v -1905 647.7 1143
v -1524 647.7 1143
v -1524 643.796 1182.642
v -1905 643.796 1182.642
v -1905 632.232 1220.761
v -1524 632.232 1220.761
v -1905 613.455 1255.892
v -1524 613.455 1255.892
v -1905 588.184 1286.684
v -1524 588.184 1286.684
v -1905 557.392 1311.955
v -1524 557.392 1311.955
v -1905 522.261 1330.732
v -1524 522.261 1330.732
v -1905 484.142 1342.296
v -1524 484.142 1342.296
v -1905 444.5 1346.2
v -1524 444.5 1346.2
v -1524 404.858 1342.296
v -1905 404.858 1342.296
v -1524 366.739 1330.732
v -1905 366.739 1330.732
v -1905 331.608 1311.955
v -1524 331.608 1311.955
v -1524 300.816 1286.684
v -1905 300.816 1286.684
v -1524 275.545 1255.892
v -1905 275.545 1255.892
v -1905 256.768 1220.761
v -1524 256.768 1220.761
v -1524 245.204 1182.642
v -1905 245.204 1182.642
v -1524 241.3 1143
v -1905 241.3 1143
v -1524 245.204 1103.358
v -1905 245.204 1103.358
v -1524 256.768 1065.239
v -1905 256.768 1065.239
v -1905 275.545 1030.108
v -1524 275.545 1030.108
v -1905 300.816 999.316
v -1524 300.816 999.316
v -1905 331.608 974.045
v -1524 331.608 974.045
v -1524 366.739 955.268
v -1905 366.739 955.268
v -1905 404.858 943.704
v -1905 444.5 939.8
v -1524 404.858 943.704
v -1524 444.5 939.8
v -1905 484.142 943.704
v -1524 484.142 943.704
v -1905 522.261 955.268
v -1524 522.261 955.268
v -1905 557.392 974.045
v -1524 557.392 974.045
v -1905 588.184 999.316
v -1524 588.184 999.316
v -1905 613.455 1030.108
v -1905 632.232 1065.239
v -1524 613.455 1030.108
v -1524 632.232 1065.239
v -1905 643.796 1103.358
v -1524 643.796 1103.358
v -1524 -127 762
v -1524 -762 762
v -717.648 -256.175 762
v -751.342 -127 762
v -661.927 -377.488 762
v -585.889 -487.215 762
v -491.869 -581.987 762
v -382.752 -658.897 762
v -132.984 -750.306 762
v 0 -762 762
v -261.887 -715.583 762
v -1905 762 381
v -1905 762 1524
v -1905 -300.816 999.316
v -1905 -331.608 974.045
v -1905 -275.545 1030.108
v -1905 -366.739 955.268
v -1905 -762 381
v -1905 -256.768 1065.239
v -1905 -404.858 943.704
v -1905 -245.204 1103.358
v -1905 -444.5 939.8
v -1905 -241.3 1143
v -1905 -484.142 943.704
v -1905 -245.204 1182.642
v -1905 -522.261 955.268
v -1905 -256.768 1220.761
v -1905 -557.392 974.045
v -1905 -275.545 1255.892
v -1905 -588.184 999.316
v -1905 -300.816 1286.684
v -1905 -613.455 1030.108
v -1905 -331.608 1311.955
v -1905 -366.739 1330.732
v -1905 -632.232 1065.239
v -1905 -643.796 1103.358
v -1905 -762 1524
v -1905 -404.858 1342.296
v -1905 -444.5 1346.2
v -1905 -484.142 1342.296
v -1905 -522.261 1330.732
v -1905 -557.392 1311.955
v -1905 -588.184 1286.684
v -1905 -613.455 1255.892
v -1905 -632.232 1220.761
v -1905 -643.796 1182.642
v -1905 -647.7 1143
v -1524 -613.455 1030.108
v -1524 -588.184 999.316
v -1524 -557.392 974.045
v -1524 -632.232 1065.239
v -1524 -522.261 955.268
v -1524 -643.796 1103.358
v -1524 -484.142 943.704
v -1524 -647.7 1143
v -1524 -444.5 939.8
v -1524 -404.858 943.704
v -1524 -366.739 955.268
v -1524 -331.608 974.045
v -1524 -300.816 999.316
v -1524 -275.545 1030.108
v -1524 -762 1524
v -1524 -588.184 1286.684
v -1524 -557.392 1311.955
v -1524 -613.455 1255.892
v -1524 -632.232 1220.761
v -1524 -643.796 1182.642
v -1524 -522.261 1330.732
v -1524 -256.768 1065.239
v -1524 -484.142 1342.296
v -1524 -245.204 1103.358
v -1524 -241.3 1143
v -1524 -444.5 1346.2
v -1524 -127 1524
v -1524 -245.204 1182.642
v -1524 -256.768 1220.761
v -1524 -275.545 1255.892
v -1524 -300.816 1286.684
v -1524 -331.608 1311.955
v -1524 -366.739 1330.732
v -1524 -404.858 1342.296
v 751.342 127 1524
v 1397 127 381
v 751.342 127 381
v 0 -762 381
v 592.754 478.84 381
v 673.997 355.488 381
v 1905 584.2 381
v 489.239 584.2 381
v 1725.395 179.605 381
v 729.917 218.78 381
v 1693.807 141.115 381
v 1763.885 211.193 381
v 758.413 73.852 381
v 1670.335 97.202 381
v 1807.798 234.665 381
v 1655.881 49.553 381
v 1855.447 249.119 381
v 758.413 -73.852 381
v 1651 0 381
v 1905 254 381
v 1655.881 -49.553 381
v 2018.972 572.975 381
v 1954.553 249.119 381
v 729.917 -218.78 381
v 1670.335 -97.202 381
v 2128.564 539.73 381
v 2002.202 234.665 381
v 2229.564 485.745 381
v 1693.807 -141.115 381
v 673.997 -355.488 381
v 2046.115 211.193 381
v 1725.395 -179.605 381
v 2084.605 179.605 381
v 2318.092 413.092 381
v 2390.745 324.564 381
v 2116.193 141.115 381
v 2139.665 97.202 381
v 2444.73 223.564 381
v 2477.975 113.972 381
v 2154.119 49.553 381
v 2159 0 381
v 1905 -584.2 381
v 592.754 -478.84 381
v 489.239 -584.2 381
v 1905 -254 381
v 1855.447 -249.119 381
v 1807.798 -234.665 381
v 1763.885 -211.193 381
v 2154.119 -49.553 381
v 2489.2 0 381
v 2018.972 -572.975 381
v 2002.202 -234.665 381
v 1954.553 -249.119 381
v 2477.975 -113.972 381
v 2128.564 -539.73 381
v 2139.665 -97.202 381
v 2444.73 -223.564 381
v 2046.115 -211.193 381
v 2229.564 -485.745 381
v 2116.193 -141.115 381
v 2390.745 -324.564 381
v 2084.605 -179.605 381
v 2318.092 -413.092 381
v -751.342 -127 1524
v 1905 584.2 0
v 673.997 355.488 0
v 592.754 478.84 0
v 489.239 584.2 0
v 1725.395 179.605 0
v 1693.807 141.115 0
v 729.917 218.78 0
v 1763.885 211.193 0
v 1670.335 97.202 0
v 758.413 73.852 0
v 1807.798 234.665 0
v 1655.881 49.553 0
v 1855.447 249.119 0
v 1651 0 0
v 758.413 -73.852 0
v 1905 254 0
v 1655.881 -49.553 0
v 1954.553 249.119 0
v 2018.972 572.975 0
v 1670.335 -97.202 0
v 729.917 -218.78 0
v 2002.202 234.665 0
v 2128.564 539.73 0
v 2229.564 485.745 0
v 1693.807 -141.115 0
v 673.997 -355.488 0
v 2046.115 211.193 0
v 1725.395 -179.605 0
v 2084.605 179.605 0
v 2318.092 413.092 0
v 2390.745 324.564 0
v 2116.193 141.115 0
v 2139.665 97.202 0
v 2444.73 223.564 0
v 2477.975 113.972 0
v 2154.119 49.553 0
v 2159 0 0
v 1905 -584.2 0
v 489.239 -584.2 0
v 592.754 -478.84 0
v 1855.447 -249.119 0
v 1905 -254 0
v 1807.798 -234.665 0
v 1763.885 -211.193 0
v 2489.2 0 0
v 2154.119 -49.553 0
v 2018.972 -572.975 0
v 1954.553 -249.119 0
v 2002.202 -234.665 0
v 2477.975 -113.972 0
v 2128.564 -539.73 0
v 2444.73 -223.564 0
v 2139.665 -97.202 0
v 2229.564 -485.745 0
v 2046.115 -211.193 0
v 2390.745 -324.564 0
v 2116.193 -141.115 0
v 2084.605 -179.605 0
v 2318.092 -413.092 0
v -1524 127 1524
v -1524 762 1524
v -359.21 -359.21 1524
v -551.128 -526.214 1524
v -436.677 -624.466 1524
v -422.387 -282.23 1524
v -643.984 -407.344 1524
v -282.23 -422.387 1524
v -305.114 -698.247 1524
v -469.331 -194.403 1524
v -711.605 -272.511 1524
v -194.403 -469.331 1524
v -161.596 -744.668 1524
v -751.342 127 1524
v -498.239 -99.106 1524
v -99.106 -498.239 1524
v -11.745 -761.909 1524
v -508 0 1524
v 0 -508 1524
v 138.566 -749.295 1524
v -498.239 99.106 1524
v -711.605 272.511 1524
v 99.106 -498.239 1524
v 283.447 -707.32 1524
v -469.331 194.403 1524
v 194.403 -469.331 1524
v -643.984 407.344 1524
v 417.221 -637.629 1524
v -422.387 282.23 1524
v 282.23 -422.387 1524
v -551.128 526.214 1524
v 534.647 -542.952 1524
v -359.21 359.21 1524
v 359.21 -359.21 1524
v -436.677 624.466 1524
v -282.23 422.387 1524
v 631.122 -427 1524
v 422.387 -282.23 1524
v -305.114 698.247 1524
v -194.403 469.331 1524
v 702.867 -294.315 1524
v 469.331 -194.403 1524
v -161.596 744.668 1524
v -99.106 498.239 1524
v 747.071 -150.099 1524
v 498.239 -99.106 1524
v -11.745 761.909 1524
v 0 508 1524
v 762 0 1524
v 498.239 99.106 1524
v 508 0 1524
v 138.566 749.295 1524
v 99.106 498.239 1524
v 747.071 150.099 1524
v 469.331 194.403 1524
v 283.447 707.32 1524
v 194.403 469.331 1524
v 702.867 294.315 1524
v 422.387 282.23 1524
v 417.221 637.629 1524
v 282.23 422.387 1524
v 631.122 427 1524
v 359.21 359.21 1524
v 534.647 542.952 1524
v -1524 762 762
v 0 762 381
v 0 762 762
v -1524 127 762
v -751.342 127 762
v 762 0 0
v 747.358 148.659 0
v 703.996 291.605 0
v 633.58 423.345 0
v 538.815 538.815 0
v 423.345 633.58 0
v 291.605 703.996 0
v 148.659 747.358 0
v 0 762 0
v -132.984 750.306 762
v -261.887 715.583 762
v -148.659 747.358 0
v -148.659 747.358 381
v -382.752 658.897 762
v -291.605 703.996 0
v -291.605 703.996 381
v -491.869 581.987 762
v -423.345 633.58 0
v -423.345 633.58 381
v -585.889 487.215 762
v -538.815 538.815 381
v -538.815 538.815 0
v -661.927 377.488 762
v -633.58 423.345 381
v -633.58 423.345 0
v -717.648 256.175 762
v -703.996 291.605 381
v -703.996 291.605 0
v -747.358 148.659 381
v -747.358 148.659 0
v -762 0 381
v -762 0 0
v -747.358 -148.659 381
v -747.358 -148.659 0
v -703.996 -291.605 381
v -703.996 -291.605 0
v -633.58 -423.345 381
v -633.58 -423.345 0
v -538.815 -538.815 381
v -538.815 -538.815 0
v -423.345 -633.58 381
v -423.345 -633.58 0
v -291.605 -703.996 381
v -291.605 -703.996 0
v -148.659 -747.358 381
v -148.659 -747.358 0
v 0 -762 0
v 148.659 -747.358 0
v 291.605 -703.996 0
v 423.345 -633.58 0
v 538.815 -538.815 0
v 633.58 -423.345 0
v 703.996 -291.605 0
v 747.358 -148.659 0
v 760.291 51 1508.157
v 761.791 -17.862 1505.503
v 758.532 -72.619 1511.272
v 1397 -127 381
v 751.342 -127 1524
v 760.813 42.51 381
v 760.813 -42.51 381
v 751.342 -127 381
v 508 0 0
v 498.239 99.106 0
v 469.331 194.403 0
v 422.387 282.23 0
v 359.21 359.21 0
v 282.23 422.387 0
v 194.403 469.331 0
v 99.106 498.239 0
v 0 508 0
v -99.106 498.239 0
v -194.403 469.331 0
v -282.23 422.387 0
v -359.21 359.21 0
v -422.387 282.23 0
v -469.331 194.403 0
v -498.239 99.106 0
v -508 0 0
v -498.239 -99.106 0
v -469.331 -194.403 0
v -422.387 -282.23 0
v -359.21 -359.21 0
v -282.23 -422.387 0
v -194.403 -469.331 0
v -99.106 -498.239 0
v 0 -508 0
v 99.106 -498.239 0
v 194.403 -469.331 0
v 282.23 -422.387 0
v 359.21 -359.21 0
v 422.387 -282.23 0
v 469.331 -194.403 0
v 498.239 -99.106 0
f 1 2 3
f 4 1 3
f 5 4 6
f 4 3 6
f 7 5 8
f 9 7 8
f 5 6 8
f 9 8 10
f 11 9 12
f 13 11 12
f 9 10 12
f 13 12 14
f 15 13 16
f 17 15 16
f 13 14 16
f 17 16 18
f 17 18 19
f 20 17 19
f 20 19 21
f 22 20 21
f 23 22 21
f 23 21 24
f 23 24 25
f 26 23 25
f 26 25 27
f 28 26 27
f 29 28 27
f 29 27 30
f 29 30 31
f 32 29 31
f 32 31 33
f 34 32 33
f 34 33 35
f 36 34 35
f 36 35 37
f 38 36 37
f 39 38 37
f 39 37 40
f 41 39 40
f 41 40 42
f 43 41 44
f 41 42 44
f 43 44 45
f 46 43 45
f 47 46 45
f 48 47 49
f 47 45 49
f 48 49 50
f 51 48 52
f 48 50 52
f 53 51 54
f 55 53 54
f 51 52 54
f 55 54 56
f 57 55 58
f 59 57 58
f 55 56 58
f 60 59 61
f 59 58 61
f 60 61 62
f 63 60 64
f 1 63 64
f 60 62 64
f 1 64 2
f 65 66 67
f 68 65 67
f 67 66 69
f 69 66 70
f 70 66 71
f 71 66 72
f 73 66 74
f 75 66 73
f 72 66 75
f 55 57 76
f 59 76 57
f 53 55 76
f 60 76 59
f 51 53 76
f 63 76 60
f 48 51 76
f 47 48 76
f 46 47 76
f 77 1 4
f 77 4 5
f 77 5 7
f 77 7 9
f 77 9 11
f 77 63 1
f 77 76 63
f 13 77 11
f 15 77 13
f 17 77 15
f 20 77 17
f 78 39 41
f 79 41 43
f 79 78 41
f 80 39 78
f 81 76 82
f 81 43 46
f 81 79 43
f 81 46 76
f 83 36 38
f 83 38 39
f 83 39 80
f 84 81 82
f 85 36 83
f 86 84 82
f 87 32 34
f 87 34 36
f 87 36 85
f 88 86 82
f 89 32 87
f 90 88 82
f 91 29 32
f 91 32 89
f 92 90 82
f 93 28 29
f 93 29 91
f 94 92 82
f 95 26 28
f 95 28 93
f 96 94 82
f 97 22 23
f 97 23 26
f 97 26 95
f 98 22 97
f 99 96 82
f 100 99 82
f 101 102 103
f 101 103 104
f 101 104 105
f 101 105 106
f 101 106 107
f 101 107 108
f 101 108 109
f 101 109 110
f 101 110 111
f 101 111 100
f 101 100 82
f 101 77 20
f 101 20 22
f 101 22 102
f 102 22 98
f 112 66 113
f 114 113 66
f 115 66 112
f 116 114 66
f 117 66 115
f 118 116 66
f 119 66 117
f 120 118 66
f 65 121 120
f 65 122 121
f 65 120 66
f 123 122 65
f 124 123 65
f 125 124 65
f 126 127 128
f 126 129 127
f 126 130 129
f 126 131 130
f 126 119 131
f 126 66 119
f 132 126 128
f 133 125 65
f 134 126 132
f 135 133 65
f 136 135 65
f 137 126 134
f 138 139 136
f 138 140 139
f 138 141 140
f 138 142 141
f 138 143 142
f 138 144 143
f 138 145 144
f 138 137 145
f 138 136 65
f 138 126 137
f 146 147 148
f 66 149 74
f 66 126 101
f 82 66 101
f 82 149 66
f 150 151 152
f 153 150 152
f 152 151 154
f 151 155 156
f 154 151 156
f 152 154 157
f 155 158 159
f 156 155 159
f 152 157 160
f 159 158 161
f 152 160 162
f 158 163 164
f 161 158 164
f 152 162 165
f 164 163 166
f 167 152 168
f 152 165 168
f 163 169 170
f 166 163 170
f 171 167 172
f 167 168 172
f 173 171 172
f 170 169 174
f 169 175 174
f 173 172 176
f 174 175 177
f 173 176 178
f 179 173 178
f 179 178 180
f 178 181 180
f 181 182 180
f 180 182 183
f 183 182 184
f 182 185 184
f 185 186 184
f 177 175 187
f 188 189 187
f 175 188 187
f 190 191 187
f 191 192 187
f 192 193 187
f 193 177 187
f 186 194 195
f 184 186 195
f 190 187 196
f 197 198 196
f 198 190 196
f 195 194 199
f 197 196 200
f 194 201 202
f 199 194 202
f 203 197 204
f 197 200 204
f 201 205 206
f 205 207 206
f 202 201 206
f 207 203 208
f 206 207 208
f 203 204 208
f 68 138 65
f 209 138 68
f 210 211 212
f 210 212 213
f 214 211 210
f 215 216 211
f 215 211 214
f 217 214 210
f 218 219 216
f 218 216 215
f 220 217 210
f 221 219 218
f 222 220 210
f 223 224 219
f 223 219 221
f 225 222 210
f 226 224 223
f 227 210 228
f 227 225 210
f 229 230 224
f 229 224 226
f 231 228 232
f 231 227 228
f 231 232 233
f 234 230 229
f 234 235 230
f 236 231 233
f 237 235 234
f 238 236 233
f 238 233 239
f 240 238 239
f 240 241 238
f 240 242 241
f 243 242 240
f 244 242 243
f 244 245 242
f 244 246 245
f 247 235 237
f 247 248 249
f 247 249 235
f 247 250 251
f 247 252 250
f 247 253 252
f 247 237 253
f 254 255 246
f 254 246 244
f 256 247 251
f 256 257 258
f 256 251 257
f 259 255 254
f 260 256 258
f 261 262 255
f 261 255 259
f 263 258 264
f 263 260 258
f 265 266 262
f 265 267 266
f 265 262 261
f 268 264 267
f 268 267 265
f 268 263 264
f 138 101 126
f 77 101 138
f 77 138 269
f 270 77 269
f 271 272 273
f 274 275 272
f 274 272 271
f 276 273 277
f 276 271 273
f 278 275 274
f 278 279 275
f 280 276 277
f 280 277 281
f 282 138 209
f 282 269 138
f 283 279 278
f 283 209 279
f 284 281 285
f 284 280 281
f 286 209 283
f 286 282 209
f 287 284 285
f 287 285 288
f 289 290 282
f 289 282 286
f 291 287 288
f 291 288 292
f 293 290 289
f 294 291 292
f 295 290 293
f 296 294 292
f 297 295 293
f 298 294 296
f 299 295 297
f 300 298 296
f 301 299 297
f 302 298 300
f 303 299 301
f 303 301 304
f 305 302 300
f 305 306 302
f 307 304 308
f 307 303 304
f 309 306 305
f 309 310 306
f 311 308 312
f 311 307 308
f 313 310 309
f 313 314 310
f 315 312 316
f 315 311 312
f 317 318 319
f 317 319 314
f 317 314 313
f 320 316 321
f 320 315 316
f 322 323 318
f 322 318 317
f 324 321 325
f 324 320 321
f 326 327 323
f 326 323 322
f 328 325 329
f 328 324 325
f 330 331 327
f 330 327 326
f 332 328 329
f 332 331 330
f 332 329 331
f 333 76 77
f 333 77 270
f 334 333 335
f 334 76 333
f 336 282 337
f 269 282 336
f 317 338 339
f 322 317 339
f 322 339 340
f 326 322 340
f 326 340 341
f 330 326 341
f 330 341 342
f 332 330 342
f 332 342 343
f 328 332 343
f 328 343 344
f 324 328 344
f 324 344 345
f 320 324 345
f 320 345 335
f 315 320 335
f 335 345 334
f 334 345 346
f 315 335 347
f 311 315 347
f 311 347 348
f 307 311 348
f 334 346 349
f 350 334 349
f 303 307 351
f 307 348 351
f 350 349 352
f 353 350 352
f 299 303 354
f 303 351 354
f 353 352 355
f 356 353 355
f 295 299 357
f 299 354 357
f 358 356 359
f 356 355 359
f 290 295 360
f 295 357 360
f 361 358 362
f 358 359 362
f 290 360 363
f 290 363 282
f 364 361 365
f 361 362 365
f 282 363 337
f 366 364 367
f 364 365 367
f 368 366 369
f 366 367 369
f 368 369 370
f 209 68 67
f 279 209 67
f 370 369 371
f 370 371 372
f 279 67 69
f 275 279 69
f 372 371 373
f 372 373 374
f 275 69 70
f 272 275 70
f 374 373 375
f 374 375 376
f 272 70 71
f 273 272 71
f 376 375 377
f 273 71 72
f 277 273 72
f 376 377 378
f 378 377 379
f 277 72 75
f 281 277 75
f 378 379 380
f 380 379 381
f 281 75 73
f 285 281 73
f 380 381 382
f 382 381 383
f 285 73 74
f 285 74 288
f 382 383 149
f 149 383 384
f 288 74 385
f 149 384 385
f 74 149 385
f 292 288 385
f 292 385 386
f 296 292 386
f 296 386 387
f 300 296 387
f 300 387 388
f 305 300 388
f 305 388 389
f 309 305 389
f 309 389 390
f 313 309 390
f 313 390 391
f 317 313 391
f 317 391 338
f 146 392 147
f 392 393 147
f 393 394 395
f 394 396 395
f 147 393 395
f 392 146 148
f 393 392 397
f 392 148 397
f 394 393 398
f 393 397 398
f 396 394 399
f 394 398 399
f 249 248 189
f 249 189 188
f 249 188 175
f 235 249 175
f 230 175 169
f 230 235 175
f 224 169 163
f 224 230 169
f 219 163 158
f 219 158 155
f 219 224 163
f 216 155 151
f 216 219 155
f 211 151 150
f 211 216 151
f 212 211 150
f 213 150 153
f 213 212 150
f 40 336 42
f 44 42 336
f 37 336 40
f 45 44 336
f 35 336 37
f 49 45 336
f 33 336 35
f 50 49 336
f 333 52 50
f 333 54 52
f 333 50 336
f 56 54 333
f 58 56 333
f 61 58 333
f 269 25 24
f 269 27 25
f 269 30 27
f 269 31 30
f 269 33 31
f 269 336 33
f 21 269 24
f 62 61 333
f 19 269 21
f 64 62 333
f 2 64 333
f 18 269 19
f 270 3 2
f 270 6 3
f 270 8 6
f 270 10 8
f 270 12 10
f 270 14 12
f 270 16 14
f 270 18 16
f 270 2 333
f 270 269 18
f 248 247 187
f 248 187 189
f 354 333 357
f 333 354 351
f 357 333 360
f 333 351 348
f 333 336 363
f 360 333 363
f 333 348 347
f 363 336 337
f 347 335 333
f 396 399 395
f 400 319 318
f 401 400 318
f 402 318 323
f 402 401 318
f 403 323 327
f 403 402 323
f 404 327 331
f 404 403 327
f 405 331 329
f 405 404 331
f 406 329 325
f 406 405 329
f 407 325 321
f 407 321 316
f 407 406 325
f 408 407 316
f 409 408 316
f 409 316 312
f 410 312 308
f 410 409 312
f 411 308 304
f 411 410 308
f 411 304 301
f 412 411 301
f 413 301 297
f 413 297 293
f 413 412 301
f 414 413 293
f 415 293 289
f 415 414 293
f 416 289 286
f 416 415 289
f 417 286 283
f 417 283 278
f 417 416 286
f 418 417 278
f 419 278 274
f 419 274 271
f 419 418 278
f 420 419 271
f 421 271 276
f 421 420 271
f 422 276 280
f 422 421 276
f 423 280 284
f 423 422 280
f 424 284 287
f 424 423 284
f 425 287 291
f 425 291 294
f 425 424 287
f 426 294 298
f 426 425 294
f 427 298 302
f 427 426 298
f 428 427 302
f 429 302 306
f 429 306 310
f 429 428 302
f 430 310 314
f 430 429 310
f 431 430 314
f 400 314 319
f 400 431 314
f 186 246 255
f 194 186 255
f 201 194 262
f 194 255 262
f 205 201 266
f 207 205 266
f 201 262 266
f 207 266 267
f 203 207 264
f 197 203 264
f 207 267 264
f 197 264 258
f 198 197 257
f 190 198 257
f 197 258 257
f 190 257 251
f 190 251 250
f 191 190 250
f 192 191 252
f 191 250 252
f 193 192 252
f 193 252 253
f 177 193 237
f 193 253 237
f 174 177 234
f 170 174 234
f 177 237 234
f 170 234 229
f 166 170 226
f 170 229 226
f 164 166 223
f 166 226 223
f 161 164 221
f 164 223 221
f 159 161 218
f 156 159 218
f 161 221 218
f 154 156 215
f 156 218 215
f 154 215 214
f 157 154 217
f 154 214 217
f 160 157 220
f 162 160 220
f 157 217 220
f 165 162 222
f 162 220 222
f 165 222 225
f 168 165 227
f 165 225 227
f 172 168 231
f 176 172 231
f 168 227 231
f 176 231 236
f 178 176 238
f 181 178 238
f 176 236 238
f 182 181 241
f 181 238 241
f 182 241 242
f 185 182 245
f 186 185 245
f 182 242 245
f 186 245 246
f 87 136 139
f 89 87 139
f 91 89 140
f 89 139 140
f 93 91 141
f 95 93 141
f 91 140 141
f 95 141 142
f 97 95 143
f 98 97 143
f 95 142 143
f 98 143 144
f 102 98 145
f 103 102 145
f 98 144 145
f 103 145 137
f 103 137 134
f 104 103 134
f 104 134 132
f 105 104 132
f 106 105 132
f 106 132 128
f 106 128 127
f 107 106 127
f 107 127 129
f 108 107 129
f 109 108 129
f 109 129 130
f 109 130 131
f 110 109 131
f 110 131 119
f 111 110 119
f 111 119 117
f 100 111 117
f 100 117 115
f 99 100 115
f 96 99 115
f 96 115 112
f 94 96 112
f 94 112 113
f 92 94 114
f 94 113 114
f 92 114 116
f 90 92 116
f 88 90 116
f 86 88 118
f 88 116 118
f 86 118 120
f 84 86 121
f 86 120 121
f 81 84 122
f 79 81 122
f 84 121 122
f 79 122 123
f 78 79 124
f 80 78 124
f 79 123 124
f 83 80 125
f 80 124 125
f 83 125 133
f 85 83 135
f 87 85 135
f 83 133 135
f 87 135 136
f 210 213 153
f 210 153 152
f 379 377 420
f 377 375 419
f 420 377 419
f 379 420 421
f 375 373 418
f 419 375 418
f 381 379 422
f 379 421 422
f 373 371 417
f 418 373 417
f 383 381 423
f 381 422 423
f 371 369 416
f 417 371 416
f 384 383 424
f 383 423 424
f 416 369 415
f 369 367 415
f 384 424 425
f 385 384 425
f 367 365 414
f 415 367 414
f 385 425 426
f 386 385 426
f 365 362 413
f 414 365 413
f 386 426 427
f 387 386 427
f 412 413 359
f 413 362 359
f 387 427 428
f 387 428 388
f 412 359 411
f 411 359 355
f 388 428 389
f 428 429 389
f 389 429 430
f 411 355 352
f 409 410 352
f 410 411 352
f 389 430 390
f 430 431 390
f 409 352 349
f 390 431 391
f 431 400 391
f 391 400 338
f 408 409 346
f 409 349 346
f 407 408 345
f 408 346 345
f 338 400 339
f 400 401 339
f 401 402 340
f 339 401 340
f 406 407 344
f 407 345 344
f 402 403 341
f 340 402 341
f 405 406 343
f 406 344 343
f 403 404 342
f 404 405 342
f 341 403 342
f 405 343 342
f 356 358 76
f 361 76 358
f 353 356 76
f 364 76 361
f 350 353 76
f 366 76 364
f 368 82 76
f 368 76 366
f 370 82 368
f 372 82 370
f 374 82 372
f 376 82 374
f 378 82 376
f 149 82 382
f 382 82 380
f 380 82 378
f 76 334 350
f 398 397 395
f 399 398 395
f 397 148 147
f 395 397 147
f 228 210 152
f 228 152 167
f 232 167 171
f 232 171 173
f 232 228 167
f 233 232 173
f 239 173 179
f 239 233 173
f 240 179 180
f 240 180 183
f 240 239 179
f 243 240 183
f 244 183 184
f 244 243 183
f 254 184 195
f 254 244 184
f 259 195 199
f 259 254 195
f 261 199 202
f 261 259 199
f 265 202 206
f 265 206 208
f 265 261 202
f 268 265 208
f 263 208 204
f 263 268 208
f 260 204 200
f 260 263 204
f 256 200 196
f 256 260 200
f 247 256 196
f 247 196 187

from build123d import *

# Parameters (mm, degrees)
F0_R      = 762
F0_R_2    = 508
F1_DEPTH  = 1524
F2_R      = 254
F3_DEPTH  = 381
F5_DEPTH  = 1143
F7_DEPTH  = 889.001
F9_DEPTH  = 1143
F11_DEPTH = 381
F12_R     = 203.2
F13_DEPTH = 381.001
F14_R     = 203.2
F15_DEPTH = 381.001


with BuildPart() as f1:
    # F0 (on Top) → F1 (new body)
    with BuildSketch(Plane.XY):
        Circle(F0_R)
        Circle(F0_R_2, mode=Mode.SUBTRACT)
    extrude(amount=F1_DEPTH)

    # F8 (on face) → F9 (join)
    with BuildSketch(Plane.XY.offset(1524)):
        with BuildLine():
            Line((-1905, 762), (-1905, 0))
            Line((-1905, 0), (-1905, -762))
            Line((-1905, -762), (-1524, -762))
            Line((-1524, -762), (-1524, -127))
            Line((-1524, -127), (-751.3421324537, -127))
            ThreePointArc((-751.3421324537, -127), (-762, 0), (-751.3421324537, 127))
            Line((-751.3421324537, 127), (-1524, 127))
            Line((-1524, 127), (-1524, 762))
            Line((-1524, 762), (-1905, 762))
        make_face()
    extrude(amount=-F9_DEPTH)

    # F10 (on face) → F11 (join)
    with BuildSketch(Plane(origin=(0, 0, 381), x_dir=(1, 0, 0), z_dir=(0, 0, -1))):
        with BuildLine():
            ThreePointArc((-751.3421324537, 127), (-491.8688849683, 581.9871132594), (0, 762))
            Line((0, 762), (-1524, 762))
            Line((-1524, 762), (-1524, 127))
            Line((-1524, 127), (-751.3421324537, 127))
        make_face()
        with BuildLine():
            Line((-1524, -762), (0, -762))
            ThreePointArc((0, -762), (-491.8688849683, -581.9871132594), (-751.3421324537, -127))
            Line((-751.3421324537, -127), (-1524, -127))
            Line((-1524, -127), (-1524, -762))
        make_face()
    extrude(amount=-F11_DEPTH)

    # F12 (on face) → F13 (cut, through all)
    with BuildSketch(Plane.YZ.offset(-1524)):
        with Locations((-444.5, 1143)):
            Circle(F12_R)
    extrude(amount=-F13_DEPTH, mode=Mode.SUBTRACT)

    # F14 (on face) → F15 (cut, through all)
    with BuildSketch(Plane.YZ.offset(-1524)):
        with Locations((444.5, 1143)):
            Circle(F14_R)
    extrude(amount=-F15_DEPTH, mode=Mode.SUBTRACT)


with BuildPart() as f3:
    # F2 (on face) → F3 (new body)
    with BuildSketch(Plane(origin=(0, 0, 0), x_dir=(1, 0, 0), z_dir=(0, 0, -1))):
        with BuildLine():
            ThreePointArc((1905, -584.2), (2318.0917815692, -413.0917815692), (2489.2, 0))
            ThreePointArc((2489.2, 0), (2318.0917815692, 413.0917815692), (1905, 584.2))
            ThreePointArc((1905, 584.2), (1320.8, 0), (1905, -584.2))
        make_face()
        with Locations((1905, 0)):
            Circle(F2_R, mode=Mode.SUBTRACT)
        with BuildLine():
            ThreePointArc((1905, -584.2), (1320.8, 0), (1905, 584.2))
            Line((1905, 584.2), (489.2385512202, 584.2))
            ThreePointArc((489.2385512202, 584.2), (690.450496426, 322.3695270728), (762, 0))
            ThreePointArc((762, 0), (690.450496426, -322.3695270728), (489.2385512202, -584.2))
            Line((489.2385512202, -584.2), (1905, -584.2))
        make_face()
    extrude(amount=-F3_DEPTH)


with BuildPart() as f5:
    # F4 (on face) → F5 (new body)
    with BuildSketch(Plane.XY.offset(381)):
        with BuildLine():
            Line((1397, 0), (762, 0))
            ThreePointArc((762, 0), (759.3308583647, -63.7232103331), (751.3421324537, -127))
            Line((751.3421324537, -127), (1397, -127))
            Line((1397, -127), (1397, 0))
        make_face()
        with BuildLine():
            ThreePointArc((751.3421324537, 127), (759.3308583647, 63.7232103331), (762, 0))
            Line((762, 0), (1397, 0))
            Line((1397, 0), (1397, 127))
            Line((1397, 127), (751.3421324537, 127))
        make_face()
    extrude(amount=F5_DEPTH)

    # F6 (on face) → F7 (cut, through all)
    with BuildSketch(Plane.XZ.offset(127)):
        Polygon((1397, 1524), (751.3421324537, 1524), (1397, 381), align=None)
    extrude(amount=-F7_DEPTH, mode=Mode.SUBTRACT)


solid = Compound([f1.part, f3.part, f5.part])
